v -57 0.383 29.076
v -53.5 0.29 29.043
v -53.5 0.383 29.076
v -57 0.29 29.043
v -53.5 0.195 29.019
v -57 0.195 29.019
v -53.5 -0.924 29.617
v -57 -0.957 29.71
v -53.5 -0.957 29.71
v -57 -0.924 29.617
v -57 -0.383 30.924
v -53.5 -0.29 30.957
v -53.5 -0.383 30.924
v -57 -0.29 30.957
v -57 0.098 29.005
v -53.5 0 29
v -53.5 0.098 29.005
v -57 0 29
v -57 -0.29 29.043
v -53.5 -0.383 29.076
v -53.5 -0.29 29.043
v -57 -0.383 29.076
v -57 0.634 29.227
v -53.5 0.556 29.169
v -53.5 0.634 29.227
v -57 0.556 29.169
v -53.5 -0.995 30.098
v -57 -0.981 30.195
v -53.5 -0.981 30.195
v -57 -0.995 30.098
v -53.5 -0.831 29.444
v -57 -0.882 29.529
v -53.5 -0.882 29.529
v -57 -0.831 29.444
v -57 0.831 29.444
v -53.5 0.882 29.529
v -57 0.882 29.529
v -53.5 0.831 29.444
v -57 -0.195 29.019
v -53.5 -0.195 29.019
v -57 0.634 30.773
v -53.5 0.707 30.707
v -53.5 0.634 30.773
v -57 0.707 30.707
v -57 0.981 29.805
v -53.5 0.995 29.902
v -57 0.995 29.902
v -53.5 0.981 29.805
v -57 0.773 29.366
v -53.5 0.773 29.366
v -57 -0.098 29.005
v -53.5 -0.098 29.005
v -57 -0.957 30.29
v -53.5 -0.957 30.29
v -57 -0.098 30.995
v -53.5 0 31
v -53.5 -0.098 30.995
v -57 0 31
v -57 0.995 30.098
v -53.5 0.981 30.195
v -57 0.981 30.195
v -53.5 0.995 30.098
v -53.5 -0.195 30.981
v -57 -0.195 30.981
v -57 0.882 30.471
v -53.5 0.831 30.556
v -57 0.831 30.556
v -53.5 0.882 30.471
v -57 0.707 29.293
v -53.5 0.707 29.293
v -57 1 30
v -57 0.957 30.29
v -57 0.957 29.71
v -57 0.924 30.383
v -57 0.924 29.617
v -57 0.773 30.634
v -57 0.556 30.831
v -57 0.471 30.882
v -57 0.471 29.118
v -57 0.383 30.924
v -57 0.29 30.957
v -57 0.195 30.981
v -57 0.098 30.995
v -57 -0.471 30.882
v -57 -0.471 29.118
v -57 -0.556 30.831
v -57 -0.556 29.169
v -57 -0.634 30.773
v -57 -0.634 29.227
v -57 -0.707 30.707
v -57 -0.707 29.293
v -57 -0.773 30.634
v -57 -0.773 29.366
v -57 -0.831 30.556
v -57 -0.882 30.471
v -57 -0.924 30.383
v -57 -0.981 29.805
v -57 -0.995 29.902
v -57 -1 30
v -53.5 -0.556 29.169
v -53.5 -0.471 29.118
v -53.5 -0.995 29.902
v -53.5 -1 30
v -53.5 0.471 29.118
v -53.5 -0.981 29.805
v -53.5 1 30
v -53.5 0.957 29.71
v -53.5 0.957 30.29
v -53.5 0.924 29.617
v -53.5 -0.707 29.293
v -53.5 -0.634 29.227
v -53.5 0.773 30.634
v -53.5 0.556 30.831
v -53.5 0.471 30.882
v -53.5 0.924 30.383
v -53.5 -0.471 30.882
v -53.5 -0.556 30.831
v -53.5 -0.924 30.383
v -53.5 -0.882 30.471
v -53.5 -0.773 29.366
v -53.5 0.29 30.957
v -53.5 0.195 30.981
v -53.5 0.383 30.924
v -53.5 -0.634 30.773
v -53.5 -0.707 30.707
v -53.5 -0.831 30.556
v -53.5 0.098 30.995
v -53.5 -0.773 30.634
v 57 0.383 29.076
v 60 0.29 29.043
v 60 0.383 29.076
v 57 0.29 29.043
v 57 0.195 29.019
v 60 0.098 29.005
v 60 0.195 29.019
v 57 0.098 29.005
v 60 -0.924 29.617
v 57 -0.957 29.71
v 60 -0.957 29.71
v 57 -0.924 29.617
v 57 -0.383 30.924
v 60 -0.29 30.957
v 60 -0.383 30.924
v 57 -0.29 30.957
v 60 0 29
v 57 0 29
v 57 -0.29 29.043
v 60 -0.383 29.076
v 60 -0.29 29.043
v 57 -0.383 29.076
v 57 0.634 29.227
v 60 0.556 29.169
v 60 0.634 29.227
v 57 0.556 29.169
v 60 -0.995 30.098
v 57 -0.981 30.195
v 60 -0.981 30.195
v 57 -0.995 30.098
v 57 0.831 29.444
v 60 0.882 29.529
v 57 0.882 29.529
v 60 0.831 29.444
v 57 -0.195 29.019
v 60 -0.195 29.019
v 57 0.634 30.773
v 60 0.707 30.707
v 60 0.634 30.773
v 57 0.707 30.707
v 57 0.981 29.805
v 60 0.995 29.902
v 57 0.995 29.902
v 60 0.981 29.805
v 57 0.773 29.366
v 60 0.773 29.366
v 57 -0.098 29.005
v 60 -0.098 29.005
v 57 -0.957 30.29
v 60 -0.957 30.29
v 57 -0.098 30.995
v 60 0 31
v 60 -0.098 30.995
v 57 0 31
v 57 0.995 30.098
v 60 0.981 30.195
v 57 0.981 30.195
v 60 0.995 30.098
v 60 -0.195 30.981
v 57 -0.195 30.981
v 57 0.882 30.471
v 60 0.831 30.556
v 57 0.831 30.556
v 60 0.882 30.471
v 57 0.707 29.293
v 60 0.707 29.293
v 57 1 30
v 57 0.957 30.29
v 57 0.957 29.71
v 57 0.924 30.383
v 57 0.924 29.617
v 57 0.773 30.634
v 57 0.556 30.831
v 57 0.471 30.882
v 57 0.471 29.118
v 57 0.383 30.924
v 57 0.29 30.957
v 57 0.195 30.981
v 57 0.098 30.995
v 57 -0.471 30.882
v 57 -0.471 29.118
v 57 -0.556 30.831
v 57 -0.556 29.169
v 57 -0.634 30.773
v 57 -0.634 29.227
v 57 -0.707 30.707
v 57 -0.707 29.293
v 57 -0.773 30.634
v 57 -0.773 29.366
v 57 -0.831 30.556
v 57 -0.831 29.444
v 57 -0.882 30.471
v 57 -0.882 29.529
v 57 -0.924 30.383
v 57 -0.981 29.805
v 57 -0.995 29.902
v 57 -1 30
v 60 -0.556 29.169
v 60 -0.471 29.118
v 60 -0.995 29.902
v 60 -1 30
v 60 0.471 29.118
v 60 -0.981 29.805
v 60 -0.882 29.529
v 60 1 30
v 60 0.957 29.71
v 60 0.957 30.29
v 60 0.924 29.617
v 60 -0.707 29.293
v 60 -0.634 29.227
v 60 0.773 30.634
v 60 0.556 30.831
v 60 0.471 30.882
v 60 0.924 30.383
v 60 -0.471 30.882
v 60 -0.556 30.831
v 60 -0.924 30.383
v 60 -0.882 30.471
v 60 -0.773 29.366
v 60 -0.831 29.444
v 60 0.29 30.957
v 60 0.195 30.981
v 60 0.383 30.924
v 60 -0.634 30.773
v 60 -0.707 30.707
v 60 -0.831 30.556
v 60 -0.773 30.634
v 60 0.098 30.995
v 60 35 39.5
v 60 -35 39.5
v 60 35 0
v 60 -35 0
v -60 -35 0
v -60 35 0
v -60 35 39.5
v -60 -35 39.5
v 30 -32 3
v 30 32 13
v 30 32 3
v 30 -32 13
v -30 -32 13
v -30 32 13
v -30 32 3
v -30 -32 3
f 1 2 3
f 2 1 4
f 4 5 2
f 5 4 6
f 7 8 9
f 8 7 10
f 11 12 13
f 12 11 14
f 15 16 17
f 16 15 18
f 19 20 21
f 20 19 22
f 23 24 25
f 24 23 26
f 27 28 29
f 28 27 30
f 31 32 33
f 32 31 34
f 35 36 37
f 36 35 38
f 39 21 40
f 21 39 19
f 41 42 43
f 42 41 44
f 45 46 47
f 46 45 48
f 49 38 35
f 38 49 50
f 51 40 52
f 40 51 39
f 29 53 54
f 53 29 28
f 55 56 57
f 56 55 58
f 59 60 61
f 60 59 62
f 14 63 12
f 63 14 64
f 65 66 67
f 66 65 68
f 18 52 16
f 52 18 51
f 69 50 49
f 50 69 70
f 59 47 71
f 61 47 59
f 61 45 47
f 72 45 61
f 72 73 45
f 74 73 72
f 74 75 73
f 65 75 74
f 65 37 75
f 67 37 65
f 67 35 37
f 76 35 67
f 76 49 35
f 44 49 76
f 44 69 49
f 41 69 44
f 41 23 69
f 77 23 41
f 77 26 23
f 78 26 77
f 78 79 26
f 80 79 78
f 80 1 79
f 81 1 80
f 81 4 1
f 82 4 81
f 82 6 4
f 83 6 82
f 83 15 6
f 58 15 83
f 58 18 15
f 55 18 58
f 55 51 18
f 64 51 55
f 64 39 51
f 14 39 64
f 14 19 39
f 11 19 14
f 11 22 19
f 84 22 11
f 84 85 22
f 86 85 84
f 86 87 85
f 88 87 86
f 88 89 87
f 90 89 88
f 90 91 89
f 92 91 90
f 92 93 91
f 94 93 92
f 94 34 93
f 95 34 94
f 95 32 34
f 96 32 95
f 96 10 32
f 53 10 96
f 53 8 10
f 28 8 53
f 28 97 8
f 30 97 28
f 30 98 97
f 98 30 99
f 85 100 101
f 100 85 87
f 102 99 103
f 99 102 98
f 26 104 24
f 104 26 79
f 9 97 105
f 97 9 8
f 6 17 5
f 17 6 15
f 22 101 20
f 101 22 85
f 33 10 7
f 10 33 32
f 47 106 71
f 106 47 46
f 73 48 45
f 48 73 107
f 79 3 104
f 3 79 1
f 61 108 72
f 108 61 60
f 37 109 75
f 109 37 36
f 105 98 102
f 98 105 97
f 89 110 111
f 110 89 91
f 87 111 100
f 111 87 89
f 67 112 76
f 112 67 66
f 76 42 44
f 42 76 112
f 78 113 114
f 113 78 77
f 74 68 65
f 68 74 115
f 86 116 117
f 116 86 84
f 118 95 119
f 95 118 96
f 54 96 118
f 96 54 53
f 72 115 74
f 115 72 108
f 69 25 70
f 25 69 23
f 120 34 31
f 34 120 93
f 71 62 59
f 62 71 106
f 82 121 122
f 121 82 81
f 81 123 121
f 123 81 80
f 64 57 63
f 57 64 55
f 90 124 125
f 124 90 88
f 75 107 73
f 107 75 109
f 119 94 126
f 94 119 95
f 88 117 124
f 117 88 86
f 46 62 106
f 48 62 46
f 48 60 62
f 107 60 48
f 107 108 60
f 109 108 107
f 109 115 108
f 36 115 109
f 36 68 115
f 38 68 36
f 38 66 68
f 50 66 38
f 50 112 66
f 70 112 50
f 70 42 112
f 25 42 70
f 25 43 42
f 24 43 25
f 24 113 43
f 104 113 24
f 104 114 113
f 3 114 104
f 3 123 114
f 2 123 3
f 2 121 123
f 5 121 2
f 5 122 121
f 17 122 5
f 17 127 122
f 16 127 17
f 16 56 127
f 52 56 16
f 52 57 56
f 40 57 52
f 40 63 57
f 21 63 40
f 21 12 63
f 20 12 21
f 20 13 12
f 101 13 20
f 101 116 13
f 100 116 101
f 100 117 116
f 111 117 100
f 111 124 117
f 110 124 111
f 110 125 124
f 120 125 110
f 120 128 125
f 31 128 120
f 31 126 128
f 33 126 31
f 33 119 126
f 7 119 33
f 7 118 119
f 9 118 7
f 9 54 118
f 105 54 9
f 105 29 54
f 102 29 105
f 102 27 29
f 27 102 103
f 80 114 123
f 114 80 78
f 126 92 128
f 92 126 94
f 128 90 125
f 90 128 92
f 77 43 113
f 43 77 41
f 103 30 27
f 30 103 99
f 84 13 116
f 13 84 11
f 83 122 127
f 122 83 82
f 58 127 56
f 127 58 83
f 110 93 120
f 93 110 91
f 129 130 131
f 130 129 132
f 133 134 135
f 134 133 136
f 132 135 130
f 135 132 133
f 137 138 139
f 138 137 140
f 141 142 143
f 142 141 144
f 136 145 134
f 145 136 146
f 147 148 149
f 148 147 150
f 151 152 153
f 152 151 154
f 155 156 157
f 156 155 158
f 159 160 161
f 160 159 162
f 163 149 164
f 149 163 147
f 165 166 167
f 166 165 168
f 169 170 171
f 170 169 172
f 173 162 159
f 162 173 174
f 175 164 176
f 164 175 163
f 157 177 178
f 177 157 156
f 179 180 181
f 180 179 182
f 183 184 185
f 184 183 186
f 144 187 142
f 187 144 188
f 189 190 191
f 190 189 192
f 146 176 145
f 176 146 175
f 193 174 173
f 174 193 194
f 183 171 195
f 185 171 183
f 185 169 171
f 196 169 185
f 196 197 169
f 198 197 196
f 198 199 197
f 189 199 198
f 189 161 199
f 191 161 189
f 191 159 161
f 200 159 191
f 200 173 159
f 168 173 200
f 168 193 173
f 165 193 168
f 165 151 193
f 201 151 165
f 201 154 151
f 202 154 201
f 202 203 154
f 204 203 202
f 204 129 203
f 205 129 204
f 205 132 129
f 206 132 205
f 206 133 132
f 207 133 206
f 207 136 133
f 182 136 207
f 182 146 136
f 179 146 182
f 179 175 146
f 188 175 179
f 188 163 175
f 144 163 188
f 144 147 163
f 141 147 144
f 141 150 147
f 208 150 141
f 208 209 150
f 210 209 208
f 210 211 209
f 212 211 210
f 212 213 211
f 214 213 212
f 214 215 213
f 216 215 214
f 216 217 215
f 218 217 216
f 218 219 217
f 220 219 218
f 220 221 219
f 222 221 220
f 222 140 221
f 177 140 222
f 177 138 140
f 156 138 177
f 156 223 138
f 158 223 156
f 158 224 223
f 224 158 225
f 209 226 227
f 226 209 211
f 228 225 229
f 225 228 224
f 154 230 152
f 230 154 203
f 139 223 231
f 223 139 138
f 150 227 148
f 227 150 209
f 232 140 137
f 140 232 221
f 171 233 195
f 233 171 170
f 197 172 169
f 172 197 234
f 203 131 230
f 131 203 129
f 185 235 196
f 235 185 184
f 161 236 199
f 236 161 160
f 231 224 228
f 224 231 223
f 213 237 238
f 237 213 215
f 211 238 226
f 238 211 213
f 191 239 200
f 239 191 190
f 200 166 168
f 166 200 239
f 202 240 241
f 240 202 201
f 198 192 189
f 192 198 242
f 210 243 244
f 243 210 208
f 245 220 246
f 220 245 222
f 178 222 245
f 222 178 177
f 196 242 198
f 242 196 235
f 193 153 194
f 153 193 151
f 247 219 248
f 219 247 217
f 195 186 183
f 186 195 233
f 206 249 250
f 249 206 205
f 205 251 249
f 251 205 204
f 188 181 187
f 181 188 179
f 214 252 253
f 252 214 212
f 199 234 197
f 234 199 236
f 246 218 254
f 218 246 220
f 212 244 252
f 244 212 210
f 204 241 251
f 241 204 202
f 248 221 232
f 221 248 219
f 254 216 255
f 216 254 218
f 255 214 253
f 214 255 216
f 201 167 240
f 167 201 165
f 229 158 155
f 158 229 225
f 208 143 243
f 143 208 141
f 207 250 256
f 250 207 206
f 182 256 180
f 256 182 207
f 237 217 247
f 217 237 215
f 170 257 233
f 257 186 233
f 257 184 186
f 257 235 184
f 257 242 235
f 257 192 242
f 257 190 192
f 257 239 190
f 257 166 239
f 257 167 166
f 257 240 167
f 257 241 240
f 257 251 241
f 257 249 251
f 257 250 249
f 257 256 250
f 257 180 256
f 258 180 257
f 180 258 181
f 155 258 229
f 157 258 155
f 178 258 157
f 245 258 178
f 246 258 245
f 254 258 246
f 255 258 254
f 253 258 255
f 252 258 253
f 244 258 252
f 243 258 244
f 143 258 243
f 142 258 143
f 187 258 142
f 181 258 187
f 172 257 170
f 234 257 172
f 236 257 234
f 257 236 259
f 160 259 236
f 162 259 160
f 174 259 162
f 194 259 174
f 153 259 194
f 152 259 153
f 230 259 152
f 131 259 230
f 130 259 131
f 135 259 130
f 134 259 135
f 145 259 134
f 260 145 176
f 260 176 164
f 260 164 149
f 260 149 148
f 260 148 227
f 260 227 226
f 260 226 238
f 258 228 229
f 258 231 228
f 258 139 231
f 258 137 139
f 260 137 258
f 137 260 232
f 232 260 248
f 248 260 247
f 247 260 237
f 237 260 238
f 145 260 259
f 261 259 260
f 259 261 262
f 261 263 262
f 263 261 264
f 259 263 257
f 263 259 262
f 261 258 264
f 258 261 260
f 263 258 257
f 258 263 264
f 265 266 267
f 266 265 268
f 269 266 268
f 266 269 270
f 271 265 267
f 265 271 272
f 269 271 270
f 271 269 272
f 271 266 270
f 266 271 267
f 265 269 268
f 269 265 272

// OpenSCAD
// Mini horizontal gel-electrophoresis buffer tank
// Print orientation: open top facing up (+Z), resting on XY plane at z = 0

// ---------------- Parameters ----------------
tank_x      = 120;   // outer length in X (mm)
tank_y      = 70;    // outer width in Y (mm)
tank_h      = 40;    // outer height in Z (mm)
wall        = 3;     // wall thickness (mm)
floor       = 3;     // floor thickness (mm)

platform_x  = 60;    // platform length in X (mm), centred
platform_y  = tank_y - 2 * wall;  // platform spans full inner width
platform_top = floor + 10;  // platform top height (z = 13)

hole_d      = 2;     // electrode hole diameter (mm)
hole_y      = 0;     // electrode hole Y position (mm)
hole_z      = 30;    // electrode hole Z position (mm)

eps         = 0.5;   // cutter overshoot past faces (mm)
$fn         = 96;    // curve resolution

// ---------------- Derived ----------------
inner_x = tank_x - 2 * wall;   // 114 mm
inner_z = tank_h - floor;      // 37 mm (floor at z = 0 to 3)

// ---------------- Model ----------------
difference() {
    // Main tank body (solid block)
    translate([-tank_x / 2, -tank_y / 2, 0])
        cube([tank_x, tank_y, tank_h]);

    // Open top: cut a shallow layer so the face is not coplanar
    translate([-tank_x / 2, -tank_y / 2, tank_h - eps])
        cube([tank_x, tank_y, eps]);

    // Raised platform in the middle of the tank floor
    // (overlaps the floor and lower walls; clean up with difference)
    translate([-platform_x / 2, -platform_y / 2, floor])
        cube([platform_x, platform_y, platform_top - floor]);

    // Electrode wire holes through each end wall, along X
    for (sx = [-1, 1])
        translate([sx > 0 ? tank_x / 2 - wall : -tank_x / 2 + wall,
                   hole_y, hole_z])
            rotate([0, 90, 0])
                cylinder(d = hole_d, h = wall + eps, $fn = 64);
}
